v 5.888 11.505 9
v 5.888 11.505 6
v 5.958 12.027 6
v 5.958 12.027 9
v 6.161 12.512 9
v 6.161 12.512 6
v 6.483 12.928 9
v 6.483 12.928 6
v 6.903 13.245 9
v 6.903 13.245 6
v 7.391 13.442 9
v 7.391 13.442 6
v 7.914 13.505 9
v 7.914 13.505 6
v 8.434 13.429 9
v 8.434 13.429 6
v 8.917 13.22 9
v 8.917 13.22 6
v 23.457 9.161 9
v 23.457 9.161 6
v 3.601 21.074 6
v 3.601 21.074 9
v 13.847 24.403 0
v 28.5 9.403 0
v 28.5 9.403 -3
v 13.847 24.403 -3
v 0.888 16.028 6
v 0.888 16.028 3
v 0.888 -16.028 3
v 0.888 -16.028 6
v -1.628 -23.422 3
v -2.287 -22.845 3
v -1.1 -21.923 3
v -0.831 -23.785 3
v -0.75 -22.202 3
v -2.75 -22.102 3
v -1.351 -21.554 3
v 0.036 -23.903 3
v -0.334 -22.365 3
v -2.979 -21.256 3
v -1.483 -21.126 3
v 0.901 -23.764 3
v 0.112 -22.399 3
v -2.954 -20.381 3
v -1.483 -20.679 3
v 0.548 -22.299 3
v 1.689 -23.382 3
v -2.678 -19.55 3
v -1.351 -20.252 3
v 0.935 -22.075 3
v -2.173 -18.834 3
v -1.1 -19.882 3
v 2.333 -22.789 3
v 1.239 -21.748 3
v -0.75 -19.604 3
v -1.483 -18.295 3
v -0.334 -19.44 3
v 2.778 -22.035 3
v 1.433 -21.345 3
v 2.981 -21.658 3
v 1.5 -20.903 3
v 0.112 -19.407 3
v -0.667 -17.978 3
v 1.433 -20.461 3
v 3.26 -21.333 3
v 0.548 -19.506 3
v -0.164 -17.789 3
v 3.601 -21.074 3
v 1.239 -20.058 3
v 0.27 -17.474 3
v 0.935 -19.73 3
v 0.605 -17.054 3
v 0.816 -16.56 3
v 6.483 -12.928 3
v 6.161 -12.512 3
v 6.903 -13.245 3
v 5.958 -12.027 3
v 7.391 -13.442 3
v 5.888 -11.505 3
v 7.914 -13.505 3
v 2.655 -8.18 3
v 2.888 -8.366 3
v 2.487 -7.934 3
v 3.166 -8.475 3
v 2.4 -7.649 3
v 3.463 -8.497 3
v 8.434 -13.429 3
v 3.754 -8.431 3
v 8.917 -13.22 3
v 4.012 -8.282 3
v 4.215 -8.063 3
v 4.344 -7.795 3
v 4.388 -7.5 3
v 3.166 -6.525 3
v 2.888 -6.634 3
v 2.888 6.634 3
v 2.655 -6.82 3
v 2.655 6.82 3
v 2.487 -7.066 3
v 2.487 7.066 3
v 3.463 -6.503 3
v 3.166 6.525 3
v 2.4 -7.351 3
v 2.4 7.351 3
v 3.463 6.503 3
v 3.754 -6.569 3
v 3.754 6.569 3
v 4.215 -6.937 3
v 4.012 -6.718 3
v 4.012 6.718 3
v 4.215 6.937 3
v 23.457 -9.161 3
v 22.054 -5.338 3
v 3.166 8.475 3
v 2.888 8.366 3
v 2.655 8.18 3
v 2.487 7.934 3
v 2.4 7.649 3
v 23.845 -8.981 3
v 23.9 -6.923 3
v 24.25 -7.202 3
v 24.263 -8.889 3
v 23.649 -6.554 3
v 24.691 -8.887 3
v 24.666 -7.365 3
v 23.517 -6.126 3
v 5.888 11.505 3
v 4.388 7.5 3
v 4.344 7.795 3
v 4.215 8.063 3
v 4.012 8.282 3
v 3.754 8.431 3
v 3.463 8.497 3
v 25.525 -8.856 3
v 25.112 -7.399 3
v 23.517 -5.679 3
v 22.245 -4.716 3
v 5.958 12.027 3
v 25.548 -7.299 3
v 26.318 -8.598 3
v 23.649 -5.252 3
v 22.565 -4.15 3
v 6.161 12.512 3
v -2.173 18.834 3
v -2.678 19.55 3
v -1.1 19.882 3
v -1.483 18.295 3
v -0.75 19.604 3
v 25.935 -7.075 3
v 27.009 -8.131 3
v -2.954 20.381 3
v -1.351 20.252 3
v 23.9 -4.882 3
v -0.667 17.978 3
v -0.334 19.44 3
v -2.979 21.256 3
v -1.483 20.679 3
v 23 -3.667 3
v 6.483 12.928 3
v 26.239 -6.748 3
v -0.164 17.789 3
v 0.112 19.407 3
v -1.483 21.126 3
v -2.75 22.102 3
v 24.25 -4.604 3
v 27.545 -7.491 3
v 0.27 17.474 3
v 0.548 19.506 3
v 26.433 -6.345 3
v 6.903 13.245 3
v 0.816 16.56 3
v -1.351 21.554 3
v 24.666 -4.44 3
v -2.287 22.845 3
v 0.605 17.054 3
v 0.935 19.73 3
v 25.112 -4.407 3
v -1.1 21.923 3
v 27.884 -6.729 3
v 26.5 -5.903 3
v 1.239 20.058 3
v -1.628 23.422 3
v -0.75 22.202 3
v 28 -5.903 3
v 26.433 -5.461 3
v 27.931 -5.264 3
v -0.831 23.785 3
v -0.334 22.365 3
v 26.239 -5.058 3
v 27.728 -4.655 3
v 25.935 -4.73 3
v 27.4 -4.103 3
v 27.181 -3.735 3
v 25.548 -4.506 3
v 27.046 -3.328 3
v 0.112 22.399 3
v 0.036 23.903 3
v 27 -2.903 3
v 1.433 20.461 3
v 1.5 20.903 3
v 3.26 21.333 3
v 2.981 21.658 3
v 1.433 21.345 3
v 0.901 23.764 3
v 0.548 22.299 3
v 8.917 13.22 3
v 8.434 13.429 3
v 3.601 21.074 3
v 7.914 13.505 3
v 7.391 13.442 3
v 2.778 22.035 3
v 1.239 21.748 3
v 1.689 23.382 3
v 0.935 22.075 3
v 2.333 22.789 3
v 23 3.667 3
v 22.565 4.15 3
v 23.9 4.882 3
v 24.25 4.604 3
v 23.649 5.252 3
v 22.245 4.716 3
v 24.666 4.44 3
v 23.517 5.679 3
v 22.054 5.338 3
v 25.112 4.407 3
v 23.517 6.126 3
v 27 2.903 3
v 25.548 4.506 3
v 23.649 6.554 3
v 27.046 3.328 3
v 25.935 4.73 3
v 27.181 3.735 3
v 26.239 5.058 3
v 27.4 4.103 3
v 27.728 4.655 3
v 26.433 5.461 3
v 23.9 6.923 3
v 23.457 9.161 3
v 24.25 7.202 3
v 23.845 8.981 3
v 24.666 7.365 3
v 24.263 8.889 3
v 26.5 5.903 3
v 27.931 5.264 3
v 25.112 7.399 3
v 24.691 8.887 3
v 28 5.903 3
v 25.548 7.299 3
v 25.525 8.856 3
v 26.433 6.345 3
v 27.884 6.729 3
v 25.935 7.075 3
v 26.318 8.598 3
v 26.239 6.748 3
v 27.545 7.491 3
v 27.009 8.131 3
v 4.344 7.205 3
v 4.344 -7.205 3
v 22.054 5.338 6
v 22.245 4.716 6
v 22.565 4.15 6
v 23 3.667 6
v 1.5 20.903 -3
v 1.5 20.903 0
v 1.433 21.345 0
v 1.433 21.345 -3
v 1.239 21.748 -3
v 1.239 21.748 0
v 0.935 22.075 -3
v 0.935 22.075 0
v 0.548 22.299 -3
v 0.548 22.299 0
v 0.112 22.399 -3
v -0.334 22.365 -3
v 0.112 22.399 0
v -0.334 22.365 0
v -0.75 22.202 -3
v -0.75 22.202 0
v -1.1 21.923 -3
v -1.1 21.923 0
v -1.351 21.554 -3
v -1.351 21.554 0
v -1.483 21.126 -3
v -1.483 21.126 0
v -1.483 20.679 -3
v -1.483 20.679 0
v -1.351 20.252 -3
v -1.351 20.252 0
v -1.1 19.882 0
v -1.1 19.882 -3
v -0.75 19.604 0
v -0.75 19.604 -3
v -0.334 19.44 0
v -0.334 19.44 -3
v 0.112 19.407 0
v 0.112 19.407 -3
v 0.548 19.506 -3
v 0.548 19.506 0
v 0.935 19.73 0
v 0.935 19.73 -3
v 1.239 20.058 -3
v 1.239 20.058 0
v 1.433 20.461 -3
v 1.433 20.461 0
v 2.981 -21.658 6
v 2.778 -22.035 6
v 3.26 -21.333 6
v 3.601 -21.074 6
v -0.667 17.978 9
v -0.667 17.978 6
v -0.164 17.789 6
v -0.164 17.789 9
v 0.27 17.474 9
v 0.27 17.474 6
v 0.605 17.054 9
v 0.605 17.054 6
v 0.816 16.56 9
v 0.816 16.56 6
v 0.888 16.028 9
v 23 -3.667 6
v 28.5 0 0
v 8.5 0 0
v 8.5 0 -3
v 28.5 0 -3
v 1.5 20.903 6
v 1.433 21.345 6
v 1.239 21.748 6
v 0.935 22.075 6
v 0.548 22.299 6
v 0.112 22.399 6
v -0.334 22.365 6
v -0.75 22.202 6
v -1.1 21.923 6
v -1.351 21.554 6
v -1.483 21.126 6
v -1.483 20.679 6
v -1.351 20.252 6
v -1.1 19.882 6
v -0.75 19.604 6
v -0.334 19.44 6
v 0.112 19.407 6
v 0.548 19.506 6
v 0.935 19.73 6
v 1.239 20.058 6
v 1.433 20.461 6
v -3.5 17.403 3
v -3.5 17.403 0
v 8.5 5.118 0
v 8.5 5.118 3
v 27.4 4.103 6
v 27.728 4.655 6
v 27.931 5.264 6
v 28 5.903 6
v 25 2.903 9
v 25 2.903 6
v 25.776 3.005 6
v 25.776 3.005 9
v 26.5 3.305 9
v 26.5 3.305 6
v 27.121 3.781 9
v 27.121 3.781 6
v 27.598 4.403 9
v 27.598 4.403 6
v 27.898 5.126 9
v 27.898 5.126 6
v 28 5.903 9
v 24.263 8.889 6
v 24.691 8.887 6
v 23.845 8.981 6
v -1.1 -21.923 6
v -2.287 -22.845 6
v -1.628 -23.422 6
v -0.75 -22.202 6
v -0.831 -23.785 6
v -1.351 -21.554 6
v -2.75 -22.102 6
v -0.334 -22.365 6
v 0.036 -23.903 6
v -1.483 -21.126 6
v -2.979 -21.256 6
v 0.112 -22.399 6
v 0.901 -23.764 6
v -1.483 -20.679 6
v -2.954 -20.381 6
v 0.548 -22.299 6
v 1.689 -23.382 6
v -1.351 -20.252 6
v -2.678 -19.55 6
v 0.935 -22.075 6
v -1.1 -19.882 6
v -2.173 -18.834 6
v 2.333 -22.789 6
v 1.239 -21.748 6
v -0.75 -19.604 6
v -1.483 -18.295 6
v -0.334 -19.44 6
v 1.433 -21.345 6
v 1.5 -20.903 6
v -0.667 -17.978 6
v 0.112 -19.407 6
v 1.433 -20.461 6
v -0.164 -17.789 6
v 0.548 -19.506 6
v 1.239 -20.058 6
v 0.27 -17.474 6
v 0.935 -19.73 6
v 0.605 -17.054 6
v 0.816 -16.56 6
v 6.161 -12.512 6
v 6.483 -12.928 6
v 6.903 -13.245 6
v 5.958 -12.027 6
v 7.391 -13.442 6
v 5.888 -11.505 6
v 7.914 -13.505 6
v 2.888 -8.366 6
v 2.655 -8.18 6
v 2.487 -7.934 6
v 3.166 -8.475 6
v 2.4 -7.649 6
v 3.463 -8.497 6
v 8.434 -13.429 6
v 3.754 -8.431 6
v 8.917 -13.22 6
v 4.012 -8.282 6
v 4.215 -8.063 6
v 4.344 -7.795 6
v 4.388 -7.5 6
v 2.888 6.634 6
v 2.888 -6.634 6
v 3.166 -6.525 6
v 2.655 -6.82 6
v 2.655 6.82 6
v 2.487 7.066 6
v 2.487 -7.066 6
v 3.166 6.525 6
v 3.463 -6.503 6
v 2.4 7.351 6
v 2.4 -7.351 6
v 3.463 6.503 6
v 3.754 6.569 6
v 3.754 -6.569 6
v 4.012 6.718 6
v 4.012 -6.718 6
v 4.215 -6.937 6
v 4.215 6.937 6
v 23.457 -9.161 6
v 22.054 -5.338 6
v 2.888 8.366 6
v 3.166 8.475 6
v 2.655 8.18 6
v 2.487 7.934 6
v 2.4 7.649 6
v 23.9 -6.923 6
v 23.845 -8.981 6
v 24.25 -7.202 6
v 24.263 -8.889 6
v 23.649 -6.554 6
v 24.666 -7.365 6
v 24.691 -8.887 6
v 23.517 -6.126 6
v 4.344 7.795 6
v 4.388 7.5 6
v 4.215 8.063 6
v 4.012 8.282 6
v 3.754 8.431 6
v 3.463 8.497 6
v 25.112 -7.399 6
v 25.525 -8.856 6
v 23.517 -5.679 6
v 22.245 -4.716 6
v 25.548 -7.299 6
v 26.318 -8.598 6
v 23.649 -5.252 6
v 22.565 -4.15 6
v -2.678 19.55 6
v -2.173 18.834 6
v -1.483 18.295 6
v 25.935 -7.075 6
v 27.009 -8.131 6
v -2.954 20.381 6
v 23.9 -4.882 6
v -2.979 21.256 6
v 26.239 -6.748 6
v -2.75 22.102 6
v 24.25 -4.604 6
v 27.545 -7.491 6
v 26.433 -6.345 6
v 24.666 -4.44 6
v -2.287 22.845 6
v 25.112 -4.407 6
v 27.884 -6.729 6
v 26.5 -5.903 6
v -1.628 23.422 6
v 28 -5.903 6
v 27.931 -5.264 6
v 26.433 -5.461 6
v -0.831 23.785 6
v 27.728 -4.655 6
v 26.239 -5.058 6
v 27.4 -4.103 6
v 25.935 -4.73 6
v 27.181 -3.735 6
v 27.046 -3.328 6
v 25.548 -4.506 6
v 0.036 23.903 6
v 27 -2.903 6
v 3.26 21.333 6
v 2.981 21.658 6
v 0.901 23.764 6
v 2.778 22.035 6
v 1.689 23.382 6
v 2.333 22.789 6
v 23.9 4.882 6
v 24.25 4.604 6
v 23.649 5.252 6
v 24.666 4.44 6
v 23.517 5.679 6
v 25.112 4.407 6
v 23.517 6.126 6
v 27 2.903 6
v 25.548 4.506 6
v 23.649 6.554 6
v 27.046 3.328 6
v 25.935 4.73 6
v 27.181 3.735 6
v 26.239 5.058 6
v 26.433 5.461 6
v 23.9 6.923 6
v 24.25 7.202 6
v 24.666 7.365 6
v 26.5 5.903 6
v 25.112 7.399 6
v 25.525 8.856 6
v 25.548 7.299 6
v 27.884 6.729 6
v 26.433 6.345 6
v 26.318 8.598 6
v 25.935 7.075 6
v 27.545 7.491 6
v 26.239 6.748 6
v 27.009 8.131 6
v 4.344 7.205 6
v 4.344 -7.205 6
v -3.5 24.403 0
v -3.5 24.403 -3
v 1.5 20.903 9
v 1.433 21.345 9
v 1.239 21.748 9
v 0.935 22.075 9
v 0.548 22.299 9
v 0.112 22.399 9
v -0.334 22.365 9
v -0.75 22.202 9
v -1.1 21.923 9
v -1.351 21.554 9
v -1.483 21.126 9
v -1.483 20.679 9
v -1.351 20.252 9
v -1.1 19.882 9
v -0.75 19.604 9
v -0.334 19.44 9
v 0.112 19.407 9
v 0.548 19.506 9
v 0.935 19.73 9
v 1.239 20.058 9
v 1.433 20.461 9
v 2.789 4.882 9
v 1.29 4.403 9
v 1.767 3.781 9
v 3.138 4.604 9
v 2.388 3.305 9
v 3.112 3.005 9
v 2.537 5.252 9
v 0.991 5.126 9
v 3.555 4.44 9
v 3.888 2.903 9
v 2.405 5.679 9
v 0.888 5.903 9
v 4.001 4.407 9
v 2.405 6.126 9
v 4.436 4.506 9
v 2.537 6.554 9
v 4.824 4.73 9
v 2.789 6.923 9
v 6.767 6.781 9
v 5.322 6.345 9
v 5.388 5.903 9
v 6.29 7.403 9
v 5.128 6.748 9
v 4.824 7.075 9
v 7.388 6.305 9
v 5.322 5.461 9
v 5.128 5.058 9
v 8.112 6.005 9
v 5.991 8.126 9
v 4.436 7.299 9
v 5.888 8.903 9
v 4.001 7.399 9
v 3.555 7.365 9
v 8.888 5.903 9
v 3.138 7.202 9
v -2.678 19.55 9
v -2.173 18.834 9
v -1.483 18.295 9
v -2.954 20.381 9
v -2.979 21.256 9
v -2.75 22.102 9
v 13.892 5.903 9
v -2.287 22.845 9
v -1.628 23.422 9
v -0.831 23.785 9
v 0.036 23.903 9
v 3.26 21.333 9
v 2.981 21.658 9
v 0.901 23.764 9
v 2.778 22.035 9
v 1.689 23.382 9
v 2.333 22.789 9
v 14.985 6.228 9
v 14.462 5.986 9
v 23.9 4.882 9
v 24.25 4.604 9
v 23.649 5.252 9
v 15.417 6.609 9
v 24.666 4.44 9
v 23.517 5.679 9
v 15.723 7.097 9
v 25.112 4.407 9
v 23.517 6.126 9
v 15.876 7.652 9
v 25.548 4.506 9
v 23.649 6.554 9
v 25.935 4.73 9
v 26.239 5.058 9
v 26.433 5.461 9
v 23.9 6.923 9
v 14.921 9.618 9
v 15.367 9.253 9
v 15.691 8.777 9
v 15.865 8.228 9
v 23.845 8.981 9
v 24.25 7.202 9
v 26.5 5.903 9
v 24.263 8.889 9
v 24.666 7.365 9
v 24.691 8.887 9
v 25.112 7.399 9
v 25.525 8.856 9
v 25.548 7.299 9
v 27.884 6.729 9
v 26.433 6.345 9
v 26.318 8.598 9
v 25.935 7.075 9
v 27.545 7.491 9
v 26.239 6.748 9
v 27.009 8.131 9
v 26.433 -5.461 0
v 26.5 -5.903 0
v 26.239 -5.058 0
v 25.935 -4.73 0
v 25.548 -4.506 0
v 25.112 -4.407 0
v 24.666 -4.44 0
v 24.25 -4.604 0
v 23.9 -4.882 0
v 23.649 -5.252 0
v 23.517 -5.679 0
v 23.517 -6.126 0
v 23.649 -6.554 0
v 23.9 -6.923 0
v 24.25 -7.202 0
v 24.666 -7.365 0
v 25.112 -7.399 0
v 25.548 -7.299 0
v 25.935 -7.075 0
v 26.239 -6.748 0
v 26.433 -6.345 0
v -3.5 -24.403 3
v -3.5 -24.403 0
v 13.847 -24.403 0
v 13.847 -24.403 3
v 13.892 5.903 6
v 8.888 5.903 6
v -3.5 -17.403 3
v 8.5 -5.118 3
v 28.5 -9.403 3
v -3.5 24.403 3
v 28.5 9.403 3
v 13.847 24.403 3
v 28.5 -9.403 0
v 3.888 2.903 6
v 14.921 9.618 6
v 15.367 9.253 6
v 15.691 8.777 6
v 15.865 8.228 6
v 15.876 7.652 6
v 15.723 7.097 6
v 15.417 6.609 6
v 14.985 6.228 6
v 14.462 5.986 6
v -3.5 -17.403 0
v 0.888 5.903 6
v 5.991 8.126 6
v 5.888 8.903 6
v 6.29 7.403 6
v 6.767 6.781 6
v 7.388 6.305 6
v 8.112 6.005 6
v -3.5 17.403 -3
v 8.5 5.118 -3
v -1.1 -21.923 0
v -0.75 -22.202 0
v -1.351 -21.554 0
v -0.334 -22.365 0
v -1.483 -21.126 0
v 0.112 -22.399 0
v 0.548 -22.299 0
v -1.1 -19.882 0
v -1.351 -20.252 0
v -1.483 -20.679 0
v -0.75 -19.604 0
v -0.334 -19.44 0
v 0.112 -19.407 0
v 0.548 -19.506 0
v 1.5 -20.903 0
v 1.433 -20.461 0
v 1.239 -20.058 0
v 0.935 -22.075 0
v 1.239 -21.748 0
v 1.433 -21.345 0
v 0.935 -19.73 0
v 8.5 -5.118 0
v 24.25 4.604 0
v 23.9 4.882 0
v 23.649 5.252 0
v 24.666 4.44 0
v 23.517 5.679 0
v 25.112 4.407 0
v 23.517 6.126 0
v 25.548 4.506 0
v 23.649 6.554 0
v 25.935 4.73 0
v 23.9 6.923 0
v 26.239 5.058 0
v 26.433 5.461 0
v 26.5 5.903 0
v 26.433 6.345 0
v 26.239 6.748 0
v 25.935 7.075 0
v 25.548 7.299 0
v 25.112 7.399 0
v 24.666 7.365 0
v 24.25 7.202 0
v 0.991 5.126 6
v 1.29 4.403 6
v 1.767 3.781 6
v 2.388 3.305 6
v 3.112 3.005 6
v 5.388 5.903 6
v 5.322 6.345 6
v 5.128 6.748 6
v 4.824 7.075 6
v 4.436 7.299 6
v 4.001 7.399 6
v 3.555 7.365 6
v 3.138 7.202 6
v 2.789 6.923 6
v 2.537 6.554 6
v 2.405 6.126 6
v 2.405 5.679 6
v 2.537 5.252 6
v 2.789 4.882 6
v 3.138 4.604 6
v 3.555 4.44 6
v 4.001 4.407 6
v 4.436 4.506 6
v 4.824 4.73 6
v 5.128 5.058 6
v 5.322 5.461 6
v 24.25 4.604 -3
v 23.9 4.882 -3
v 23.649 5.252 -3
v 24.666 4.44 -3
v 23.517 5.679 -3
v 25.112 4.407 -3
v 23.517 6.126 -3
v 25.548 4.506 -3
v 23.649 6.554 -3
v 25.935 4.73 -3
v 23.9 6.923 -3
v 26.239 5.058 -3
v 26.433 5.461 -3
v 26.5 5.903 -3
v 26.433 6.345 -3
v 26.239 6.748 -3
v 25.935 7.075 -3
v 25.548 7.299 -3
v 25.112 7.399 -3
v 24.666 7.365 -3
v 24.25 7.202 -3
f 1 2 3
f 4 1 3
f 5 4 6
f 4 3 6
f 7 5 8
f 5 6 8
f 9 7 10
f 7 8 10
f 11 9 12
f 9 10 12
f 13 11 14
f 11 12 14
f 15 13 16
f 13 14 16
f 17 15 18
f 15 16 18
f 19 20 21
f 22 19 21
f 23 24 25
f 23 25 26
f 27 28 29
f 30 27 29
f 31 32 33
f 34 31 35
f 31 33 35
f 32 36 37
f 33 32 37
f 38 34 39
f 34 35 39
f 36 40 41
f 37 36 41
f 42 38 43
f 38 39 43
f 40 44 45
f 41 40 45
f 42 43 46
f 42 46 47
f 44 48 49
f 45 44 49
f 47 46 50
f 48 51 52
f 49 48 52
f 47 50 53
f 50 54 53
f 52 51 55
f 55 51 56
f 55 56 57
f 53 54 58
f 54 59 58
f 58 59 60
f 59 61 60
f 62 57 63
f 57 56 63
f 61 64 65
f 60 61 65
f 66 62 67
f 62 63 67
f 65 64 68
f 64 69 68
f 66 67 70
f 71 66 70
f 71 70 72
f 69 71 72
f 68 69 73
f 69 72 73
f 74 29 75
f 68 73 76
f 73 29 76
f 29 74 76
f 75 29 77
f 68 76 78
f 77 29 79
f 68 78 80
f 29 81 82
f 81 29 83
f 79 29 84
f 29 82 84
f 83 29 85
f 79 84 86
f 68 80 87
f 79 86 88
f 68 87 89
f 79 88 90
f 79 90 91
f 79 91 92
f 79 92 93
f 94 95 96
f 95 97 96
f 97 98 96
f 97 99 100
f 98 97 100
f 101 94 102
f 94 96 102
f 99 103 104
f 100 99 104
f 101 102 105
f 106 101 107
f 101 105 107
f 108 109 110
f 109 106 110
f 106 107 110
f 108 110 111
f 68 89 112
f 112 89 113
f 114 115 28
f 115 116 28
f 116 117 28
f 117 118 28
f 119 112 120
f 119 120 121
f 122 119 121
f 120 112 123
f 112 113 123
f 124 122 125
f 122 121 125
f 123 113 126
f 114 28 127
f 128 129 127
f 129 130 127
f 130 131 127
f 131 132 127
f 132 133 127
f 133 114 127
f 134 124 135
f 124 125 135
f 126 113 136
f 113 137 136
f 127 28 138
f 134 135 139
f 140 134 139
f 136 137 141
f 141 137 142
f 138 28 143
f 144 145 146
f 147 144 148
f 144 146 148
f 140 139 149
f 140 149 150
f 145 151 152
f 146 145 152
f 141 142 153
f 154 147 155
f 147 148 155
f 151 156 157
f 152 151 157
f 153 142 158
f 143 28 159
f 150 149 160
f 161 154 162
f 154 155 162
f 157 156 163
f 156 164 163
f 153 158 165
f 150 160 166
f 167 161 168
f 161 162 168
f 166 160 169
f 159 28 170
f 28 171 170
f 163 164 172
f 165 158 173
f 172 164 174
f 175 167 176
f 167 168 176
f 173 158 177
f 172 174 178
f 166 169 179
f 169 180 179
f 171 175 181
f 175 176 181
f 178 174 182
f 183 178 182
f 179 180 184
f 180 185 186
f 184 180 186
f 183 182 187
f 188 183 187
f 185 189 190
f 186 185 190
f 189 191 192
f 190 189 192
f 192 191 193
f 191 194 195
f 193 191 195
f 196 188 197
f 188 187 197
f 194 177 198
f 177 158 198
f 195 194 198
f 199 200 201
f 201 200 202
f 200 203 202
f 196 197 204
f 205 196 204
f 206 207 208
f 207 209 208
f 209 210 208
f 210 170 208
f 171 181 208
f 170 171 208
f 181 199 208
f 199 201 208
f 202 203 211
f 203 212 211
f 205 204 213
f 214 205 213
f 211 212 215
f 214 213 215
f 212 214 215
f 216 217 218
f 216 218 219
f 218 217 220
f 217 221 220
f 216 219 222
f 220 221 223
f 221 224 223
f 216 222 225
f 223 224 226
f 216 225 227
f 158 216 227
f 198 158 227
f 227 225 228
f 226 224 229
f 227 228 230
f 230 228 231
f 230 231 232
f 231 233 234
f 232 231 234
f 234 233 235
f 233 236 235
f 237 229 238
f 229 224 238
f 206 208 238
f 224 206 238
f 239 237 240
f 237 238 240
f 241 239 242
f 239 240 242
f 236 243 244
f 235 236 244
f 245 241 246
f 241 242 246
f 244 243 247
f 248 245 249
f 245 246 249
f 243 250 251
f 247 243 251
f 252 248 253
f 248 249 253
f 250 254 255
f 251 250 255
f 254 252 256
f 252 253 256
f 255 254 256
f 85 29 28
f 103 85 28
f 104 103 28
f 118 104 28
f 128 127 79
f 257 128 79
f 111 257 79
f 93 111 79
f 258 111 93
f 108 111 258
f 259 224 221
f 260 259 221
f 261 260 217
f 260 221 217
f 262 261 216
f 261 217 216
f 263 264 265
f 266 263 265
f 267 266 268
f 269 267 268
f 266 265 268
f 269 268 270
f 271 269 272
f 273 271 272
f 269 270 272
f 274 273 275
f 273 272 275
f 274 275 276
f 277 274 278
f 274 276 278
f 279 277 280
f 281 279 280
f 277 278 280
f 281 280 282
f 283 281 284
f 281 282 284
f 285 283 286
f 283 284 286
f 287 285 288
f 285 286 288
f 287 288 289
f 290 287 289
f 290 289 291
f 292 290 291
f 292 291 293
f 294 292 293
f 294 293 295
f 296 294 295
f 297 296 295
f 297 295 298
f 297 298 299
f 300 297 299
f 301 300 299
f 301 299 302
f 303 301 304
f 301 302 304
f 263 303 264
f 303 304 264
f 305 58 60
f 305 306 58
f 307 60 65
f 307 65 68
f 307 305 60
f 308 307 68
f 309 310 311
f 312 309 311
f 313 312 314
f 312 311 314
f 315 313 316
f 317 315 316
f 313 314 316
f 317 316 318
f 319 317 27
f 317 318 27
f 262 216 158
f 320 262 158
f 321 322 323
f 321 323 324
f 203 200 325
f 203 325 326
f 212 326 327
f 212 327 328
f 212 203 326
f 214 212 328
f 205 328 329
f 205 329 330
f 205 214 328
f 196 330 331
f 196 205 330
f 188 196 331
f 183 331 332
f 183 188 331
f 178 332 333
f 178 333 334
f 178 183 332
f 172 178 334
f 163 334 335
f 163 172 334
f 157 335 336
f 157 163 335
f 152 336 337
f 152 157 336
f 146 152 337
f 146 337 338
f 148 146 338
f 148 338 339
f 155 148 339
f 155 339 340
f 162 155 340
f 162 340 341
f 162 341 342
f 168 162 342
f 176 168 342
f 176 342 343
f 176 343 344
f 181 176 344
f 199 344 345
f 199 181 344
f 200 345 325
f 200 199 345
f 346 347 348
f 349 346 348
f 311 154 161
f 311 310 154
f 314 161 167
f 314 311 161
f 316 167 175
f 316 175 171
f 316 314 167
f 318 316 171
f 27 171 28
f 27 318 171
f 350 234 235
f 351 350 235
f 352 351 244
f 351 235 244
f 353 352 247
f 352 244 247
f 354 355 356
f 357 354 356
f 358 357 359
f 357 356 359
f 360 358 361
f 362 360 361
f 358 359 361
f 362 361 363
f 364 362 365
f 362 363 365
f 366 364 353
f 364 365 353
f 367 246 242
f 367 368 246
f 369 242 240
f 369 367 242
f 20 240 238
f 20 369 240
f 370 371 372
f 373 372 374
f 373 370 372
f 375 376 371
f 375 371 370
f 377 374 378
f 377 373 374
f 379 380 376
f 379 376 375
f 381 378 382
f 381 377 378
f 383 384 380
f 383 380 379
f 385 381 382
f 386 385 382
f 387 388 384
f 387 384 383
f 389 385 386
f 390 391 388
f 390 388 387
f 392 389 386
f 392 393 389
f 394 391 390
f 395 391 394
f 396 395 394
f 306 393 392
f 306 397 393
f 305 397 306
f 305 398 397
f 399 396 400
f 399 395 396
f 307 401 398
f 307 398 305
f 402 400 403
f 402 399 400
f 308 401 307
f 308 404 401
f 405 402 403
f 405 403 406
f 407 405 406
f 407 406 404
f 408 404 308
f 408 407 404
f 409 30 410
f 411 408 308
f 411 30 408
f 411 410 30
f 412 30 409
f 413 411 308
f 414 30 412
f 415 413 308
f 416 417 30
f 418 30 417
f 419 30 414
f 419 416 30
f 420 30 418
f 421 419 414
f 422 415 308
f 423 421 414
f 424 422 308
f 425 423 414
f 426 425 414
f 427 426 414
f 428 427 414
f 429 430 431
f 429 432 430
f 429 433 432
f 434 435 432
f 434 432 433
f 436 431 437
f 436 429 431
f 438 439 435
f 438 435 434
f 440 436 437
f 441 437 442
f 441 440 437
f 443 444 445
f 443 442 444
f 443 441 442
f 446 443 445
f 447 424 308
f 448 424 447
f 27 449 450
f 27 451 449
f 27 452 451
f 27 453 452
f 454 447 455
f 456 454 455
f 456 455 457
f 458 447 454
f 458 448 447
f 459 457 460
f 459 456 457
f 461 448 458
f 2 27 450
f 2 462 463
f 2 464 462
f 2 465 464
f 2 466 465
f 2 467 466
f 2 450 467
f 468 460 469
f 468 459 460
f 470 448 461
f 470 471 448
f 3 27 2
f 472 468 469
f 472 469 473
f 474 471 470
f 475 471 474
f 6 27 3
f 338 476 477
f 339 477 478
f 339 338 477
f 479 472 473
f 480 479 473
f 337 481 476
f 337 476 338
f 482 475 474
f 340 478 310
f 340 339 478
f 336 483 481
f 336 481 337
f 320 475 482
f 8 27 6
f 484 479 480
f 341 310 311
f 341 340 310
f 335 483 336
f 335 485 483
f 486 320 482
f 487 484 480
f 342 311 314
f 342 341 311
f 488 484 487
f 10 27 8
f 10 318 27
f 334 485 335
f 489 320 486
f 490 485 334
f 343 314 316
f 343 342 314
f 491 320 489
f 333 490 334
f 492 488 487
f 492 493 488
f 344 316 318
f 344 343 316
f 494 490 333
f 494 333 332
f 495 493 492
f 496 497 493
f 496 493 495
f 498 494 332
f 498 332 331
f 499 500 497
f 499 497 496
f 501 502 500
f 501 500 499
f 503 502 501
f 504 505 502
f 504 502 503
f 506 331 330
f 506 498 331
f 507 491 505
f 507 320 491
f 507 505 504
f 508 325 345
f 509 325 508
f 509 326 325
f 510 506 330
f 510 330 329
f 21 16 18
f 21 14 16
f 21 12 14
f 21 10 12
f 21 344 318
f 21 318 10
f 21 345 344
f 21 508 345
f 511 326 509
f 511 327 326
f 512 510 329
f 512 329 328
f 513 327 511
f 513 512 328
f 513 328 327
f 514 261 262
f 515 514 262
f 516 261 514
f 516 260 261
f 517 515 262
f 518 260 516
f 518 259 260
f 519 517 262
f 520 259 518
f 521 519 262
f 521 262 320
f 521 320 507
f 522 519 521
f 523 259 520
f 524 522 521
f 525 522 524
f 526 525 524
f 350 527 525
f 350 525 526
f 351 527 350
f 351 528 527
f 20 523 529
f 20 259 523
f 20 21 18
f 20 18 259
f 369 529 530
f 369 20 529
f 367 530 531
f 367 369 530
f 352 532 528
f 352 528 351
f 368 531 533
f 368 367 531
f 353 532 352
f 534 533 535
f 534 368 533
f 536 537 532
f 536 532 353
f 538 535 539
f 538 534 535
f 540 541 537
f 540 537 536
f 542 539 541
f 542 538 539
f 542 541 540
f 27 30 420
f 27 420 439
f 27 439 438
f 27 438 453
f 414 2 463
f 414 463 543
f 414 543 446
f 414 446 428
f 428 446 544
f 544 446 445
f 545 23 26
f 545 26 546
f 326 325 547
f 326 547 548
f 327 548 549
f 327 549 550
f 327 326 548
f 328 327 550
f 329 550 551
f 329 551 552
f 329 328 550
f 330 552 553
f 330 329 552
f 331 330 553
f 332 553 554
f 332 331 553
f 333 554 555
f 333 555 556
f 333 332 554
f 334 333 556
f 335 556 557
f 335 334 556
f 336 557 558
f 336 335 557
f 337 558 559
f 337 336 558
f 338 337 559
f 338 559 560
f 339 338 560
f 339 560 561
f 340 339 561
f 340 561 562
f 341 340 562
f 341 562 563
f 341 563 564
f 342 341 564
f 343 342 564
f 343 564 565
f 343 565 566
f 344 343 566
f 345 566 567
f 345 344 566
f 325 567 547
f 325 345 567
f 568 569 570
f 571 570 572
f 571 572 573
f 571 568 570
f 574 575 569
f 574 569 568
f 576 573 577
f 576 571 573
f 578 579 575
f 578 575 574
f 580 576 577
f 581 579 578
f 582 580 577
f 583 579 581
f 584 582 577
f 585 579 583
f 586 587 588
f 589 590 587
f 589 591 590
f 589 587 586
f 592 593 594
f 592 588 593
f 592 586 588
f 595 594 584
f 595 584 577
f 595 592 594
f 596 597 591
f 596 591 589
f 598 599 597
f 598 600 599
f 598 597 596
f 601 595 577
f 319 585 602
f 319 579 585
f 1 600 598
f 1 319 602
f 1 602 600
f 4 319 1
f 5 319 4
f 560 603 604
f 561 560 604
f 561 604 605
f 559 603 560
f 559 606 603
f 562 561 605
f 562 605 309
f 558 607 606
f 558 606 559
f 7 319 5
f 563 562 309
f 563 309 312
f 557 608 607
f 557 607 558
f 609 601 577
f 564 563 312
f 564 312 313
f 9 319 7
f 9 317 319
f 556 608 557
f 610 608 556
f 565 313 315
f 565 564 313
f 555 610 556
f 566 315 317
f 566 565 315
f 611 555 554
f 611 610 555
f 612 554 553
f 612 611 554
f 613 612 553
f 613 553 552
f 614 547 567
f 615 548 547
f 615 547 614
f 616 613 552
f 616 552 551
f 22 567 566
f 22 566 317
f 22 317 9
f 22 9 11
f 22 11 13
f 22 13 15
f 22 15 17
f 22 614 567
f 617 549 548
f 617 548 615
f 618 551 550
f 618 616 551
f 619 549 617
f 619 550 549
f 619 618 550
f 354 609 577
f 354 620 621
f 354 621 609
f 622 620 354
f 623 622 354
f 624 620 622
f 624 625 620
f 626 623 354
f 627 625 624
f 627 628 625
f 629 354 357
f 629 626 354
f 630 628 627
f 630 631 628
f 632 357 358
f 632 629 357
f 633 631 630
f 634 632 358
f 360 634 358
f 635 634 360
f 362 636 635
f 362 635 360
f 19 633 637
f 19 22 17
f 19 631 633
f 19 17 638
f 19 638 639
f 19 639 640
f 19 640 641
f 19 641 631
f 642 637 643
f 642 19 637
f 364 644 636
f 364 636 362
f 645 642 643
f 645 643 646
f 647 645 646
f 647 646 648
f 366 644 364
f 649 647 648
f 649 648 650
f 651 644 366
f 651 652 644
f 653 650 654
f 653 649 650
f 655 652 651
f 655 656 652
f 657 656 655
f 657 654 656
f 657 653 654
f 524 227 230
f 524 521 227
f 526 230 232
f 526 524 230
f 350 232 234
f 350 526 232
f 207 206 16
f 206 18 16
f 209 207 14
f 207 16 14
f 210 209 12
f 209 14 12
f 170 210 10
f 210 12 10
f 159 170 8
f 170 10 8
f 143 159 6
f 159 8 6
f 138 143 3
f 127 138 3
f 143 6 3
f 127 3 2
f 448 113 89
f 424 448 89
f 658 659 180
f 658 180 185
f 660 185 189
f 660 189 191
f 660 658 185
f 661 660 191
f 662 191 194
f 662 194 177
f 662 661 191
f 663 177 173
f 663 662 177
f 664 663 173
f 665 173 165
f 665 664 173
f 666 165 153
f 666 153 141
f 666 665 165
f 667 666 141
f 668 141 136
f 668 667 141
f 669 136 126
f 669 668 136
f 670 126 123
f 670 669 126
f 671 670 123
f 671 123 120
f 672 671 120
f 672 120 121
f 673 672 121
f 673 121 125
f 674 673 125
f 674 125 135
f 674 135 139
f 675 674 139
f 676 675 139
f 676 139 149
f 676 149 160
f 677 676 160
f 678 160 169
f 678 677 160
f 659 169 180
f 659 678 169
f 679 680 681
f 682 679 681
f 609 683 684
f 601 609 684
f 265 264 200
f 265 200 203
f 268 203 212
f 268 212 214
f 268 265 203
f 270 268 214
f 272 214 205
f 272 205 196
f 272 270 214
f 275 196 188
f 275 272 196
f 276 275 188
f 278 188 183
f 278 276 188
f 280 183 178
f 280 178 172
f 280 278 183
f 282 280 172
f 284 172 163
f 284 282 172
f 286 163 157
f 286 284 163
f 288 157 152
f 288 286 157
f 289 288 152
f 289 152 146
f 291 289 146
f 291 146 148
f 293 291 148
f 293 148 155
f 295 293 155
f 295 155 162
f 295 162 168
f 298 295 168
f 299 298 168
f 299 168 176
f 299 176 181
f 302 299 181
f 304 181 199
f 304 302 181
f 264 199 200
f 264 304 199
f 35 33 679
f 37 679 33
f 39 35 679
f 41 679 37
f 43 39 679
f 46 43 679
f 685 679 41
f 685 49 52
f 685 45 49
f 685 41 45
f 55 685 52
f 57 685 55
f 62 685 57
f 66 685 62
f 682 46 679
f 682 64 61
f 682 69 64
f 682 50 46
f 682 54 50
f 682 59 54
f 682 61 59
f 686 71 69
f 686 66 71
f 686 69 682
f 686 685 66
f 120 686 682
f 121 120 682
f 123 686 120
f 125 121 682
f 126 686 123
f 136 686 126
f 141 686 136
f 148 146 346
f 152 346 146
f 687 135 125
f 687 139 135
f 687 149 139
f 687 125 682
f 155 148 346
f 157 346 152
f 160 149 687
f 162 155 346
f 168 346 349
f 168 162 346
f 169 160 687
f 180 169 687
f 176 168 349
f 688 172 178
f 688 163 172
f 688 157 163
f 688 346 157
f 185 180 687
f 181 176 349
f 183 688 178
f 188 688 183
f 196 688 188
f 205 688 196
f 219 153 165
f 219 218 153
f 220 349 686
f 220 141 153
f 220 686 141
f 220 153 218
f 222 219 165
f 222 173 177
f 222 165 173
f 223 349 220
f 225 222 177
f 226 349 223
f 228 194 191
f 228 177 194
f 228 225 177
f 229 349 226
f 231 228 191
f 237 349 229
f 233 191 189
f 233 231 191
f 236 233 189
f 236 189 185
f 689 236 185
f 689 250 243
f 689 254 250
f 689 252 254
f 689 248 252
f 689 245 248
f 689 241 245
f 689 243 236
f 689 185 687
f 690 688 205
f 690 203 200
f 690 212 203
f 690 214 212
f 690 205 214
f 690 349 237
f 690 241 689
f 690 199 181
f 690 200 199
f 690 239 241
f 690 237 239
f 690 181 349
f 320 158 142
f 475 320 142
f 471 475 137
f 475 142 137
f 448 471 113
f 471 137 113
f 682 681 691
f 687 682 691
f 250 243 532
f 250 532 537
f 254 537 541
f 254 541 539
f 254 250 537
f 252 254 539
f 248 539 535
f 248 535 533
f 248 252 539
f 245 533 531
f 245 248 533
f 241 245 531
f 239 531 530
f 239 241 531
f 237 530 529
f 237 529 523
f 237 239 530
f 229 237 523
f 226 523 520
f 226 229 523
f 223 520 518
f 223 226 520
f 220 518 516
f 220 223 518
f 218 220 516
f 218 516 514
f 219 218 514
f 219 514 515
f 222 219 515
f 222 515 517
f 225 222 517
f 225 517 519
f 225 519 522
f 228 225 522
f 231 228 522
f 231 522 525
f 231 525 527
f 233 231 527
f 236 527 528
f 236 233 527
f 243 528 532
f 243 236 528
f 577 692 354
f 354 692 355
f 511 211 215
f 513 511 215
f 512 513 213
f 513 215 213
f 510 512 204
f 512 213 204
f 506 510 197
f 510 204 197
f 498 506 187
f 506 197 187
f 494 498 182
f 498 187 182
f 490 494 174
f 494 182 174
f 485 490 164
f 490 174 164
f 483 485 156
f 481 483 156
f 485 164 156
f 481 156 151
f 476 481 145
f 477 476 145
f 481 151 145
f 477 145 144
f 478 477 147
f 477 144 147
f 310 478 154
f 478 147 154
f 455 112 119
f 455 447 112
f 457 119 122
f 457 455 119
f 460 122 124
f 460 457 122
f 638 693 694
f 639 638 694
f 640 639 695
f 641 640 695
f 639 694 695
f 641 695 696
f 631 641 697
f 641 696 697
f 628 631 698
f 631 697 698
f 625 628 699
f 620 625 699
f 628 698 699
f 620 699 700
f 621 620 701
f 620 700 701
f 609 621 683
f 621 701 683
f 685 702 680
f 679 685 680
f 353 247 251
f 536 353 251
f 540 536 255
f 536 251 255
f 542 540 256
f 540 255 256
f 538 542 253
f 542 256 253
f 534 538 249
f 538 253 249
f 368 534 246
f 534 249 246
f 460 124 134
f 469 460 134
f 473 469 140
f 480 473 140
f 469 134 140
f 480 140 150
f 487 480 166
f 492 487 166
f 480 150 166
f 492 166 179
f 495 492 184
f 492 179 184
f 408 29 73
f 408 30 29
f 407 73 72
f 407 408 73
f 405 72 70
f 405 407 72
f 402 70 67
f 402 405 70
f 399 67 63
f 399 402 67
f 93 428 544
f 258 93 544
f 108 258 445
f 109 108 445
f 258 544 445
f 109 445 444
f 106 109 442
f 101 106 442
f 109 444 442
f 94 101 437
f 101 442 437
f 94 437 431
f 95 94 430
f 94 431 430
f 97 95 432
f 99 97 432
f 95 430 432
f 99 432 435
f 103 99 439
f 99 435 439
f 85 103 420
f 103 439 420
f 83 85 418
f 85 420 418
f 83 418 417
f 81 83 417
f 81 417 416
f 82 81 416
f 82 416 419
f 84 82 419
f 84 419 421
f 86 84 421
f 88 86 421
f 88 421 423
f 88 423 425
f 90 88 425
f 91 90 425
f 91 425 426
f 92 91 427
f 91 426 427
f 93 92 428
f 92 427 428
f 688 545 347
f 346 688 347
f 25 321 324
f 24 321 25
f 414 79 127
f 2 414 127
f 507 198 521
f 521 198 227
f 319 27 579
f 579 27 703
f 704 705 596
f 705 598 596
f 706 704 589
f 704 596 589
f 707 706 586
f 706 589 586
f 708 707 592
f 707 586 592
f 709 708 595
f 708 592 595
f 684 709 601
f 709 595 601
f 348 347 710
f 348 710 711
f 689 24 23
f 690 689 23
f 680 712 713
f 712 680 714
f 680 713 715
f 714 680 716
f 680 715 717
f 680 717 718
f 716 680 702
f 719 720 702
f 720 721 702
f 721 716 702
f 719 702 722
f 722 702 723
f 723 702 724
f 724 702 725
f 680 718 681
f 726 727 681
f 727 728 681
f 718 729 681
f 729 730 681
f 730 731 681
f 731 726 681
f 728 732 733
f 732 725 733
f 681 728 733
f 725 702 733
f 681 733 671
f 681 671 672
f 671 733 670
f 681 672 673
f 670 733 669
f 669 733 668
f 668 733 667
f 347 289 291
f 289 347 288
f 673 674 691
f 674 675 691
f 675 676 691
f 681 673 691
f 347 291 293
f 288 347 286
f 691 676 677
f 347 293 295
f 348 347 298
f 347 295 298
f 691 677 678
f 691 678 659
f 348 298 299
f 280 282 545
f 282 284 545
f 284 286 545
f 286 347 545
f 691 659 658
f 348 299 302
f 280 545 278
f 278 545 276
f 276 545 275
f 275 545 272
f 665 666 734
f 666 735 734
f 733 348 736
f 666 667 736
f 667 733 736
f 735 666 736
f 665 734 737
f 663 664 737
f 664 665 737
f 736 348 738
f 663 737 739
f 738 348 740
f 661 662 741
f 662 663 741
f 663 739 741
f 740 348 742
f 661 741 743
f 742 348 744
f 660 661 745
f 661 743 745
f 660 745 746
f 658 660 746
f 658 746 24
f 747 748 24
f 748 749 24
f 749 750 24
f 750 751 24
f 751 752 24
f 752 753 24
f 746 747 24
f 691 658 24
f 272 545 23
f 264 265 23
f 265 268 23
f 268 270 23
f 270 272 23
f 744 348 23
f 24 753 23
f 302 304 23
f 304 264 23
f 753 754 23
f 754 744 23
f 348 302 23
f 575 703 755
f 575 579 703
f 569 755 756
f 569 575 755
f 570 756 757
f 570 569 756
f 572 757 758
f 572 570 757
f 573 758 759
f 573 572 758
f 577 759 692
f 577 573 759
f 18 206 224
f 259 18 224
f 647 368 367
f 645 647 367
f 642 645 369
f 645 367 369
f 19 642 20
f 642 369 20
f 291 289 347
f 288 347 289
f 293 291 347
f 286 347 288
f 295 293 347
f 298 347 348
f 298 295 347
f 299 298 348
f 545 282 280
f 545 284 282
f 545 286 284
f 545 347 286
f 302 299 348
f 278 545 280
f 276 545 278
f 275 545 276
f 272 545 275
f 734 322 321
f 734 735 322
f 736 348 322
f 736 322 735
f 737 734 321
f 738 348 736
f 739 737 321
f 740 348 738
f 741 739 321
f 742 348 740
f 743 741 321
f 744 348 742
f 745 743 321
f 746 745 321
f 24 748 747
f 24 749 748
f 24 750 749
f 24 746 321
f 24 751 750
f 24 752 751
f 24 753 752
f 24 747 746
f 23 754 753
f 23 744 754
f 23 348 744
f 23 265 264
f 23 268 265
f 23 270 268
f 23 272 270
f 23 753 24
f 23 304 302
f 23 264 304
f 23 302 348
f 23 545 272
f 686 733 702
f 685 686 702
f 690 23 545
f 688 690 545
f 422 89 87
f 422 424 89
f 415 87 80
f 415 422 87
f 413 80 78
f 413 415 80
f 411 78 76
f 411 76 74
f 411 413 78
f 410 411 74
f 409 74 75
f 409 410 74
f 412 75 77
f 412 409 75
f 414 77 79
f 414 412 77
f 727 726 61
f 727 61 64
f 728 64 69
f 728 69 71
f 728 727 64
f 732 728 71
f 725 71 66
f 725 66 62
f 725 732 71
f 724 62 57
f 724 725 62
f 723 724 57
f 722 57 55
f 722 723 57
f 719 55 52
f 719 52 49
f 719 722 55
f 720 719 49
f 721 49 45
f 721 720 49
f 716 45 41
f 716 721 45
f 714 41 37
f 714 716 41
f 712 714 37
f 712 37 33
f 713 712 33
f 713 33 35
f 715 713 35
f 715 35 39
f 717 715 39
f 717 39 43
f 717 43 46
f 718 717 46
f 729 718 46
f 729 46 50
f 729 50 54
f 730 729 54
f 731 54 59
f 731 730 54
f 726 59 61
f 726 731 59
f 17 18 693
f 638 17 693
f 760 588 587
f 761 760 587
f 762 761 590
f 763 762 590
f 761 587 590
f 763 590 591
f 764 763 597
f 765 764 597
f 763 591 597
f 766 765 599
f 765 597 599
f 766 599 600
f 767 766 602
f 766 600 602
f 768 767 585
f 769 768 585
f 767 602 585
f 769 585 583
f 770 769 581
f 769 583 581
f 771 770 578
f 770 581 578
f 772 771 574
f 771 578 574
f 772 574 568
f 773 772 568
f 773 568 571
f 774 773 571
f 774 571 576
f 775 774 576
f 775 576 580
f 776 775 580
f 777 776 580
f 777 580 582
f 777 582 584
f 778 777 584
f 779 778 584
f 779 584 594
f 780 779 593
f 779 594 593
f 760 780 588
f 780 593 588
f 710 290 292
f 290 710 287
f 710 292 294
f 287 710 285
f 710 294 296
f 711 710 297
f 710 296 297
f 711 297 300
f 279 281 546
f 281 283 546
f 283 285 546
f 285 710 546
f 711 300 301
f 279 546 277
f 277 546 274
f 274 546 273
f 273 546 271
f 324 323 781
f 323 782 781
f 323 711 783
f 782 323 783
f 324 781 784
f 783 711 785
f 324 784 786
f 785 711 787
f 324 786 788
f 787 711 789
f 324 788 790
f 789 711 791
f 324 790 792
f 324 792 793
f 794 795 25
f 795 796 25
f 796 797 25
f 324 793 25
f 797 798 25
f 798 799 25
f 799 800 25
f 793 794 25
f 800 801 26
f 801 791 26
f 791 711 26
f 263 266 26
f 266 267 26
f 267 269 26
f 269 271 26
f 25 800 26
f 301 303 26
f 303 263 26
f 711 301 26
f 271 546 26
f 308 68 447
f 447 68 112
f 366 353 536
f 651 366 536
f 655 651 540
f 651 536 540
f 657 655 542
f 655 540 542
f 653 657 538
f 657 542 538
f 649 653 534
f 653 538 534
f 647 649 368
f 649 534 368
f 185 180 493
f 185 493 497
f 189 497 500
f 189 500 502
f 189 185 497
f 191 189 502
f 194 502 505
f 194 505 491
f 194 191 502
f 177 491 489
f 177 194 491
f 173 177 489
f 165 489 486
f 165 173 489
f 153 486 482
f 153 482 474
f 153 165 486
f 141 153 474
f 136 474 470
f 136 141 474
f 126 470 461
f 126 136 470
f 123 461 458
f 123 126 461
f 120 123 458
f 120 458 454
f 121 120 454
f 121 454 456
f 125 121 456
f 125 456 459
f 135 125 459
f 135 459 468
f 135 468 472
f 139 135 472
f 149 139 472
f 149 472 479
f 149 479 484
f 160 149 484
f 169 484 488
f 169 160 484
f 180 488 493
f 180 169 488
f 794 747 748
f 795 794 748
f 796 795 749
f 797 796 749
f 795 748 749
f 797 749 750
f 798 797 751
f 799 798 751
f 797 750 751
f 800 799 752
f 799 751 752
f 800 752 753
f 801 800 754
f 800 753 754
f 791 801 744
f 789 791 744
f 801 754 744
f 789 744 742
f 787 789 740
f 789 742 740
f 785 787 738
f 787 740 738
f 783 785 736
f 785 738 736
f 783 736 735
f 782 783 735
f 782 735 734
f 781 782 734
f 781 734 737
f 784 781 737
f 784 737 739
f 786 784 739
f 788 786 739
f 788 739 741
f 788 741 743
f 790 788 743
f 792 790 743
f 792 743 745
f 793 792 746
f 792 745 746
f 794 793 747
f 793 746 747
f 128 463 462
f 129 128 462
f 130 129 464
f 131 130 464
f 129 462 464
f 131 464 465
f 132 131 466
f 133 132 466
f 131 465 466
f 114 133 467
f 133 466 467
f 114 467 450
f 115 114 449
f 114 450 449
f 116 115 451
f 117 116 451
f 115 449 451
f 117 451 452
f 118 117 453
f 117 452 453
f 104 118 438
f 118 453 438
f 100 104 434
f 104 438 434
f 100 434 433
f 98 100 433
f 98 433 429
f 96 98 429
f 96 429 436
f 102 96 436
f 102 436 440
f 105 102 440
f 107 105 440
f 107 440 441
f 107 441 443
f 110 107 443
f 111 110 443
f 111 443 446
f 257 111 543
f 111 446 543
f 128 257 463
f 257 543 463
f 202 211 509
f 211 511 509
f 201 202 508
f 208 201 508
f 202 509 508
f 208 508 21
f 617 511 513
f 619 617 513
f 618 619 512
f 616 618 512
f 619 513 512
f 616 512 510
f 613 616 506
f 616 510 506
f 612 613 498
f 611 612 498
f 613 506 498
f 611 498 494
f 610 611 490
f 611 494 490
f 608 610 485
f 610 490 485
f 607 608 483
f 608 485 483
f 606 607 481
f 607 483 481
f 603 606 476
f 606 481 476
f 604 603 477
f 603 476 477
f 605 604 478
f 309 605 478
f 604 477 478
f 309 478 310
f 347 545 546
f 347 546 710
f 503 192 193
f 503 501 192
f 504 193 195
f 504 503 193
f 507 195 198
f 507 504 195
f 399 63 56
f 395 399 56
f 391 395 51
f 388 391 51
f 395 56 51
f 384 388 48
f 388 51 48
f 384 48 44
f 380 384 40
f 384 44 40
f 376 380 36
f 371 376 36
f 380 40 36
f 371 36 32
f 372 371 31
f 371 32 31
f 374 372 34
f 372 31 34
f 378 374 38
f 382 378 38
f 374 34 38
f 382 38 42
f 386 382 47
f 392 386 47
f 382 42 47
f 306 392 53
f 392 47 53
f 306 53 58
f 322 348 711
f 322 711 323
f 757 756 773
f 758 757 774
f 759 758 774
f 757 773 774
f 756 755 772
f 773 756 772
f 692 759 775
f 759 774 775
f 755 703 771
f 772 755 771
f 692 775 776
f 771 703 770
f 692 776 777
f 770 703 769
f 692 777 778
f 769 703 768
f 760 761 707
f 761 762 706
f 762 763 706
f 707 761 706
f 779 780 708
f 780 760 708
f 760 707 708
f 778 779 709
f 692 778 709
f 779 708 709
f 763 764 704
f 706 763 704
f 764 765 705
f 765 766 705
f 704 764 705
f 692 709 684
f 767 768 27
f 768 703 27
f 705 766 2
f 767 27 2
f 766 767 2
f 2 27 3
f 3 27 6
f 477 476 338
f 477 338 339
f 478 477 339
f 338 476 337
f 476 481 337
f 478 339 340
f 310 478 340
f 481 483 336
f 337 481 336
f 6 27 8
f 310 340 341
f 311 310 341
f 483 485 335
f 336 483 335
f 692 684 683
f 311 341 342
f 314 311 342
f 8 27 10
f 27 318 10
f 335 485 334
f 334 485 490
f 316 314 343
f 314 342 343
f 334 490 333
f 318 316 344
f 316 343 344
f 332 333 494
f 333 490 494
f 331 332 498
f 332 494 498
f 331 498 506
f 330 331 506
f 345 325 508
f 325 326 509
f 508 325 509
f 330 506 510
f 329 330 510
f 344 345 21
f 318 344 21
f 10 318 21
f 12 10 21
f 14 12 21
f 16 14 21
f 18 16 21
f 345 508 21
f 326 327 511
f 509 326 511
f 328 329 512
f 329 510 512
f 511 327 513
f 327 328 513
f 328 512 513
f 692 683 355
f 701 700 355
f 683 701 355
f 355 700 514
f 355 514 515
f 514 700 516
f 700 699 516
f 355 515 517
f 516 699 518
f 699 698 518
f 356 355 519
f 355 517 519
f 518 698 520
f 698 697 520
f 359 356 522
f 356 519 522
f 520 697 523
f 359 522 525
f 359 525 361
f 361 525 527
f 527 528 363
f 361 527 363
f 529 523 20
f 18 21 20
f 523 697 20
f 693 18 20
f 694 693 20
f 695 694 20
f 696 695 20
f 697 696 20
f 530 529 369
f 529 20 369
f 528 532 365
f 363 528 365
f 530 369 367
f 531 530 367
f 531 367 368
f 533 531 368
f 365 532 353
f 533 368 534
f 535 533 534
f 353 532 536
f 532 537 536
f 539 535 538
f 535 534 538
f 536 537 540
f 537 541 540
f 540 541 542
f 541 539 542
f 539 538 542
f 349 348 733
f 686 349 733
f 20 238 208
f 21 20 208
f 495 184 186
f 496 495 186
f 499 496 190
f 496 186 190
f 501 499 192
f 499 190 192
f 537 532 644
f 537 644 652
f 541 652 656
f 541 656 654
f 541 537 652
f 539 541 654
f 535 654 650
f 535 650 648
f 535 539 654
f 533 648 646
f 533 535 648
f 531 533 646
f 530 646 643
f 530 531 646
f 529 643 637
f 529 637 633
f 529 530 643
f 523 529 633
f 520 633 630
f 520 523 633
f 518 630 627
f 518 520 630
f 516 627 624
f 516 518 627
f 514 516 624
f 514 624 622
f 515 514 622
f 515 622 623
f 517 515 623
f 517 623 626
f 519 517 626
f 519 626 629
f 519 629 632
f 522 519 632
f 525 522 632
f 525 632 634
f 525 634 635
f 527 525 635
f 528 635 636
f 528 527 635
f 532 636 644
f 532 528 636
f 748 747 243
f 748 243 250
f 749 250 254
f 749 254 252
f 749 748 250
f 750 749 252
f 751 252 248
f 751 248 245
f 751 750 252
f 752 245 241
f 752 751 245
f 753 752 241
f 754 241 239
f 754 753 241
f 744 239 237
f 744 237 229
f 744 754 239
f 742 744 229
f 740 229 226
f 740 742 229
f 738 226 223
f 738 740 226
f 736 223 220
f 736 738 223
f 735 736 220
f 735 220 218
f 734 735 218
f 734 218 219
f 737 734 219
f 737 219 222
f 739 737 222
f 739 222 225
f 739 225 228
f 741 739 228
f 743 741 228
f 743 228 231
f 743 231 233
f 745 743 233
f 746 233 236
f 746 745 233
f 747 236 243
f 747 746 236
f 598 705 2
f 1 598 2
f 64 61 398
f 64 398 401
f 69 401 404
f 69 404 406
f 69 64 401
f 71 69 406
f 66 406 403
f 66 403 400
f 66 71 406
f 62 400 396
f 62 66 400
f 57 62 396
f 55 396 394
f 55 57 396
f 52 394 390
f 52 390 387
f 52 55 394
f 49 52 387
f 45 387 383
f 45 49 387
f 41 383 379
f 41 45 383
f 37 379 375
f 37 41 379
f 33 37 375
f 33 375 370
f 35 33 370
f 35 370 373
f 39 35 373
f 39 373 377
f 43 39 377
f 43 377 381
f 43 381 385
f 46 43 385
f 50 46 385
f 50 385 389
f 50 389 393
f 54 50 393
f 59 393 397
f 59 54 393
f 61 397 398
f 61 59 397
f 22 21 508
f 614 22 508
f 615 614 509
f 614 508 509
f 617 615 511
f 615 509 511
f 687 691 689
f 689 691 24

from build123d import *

# Parameters (mm, degrees)
F0_R      = 1.5
F1_DEPTH  = 3
F2_DEPTH  = 3
F3_R      = 1.5
F4_DEPTH  = 3
F5_R      = 2
F6_R      = 1.5
F7_DEPTH  = 3
F8_R      = 3
F9_R      = 1
F10_DEPTH = 3
F11_R     = 1.5
F12_DEPTH = 3


with BuildPart() as f1:
    # F0 (on Top) → F1 (new body)
    with BuildSketch(Plane.XY):
        Polygon((-3.5, 17.40274), (8.5, 5.1184529412), (8.5, 0), (28.5, 0), (28.5, 9.40274), (13.8471349914, 24.40274), (-3.5, 24.40274), align=None)
        with Locations((0, 20.90274)):
            Circle(F0_R, mode=Mode.SUBTRACT)
        with Locations((25, 5.90274)):
            Circle(F0_R, mode=Mode.SUBTRACT)
        Polygon((28.5, 0), (8.5, 0), (8.5, -5.1184529412), (-3.5, -17.40274), (-3.5, -24.40274), (13.8471349914, -24.40274), (28.5, -9.40274), align=None)
        with Locations((0, -20.90274)):
            Circle(F0_R, mode=Mode.SUBTRACT)
        with Locations((25, -5.90274)):
            Circle(F0_R, mode=Mode.SUBTRACT)
    extrude(amount=F1_DEPTH)


with BuildPart() as f2:
    # F0 (on Top) → F2 (new body)
    with BuildSketch(Plane.XY):
        Polygon((-3.5, 17.40274), (8.5, 5.1184529412), (8.5, 0), (28.5, 0), (28.5, 9.40274), (13.8471349914, 24.40274), (-3.5, 24.40274), align=None)
        with Locations((0, 20.90274)):
            Circle(F0_R, mode=Mode.SUBTRACT)
        with Locations((25, 5.90274)):
            Circle(F0_R, mode=Mode.SUBTRACT)
    extrude(amount=-F2_DEPTH)


with BuildPart() as f4:
    # F3 (on face) → F4 (new body)
    with BuildSketch(Plane.XY.offset(3)):
        with BuildLine():
            ThreePointArc((0.8884209613, 18.0373066653), (2.415084148, 19.1230297545), (3, 20.90274))
            ThreePointArc((3, 20.90274), (2.9865709391, 21.1862784022), (2.946403983, 21.4672783682))
            ThreePointArc((2.946403983, 21.4672783682), (-2.5724787771, 22.4462272663), (0.8884209613, 18.0373066653))
        make_face()
        with Locations((0, 20.90274)):
            Circle(F3_R, mode=Mode.SUBTRACT)
        with BuildLine():
            ThreePointArc((3, -20.90274), (2.415084148, -19.1230297545), (0.8884209613, -18.0373066653))
            ThreePointArc((0.8884209613, -18.0373066653), (-2.5724787771, -22.4462272663), (2.946403983, -21.4672783682))
            ThreePointArc((2.946403983, -21.4672783682), (2.9865709391, -21.1862784022), (3, -20.90274))
        make_face()
        with Locations((0, -20.90274)):
            Circle(F3_R, mode=Mode.SUBTRACT)
        with BuildLine():
            Line((27, -3.6666720225), (27, 3.6666720225))
            ThreePointArc((27, 3.6666720225), (25, 2.90274), (23, 3.6666720225))
            Line((23, 3.6666720225), (23, -3.6666720225))
            ThreePointArc((23, -3.6666720225), (25, -2.90274), (27, -3.6666720225))
        make_face()
        with BuildLine():
            ThreePointArc((28, 5.90274), (26.7797102455, 8.317824148), (24.1115790387, 8.7681733347))
            ThreePointArc((24.1115790387, 8.7681733347), (22.4275212229, 7.4462272663), (22.053596017, 5.3382016318))
            ThreePointArc((22.053596017, 5.3382016318), (22.3894002797, 4.424643555), (23, 3.6666720225))
            ThreePointArc((23, 3.6666720225), (25, 2.90274), (27, 3.6666720225))
            ThreePointArc((27, 3.6666720225), (27.7386127875, 4.6779951286), (28, 5.90274))
        make_face()
        with Locations((25, 5.90274)):
            Circle(F3_R, mode=Mode.SUBTRACT)
        with BuildLine():
            ThreePointArc((2.946403983, 21.4672783682), (2.9865709391, 21.1862784022), (3, 20.90274))
            ThreePointArc((3, 20.90274), (2.415084148, 19.1230297545), (0.8884209613, 18.0373066653))
            Line((0.8884209613, 18.0373066653), (5.8884209613, 15.0373066653))
            Line((5.8884209613, 15.0373066653), (22.053596017, 5.3382016318))
            ThreePointArc((22.053596017, 5.3382016318), (22.4275212229, 7.4462272663), (24.1115790387, 8.7681733347))
            Line((24.1115790387, 8.7681733347), (2.946403983, 21.4672783682))
        make_face()
        with BuildLine():
            ThreePointArc((28, -5.90274), (27.7386127875, -4.6779951286), (27, -3.6666720225))
            ThreePointArc((27, -3.6666720225), (25, -2.90274), (23, -3.6666720225))
            ThreePointArc((23, -3.6666720225), (22.3894002797, -4.424643555), (22.053596017, -5.3382016318))
            ThreePointArc((22.053596017, -5.3382016318), (22.4275212229, -7.4462272663), (24.1115790387, -8.7681733347))
            ThreePointArc((24.1115790387, -8.7681733347), (26.7797102455, -8.317824148), (28, -5.90274))
        make_face()
        with Locations((25, -5.90274)):
            Circle(F3_R, mode=Mode.SUBTRACT)
        with BuildLine():
            Line((5.8884209613, -15.0373066653), (0.8884209613, -18.0373066653))
            ThreePointArc((0.8884209613, -18.0373066653), (2.415084148, -19.1230297545), (3, -20.90274))
            ThreePointArc((3, -20.90274), (2.9865709391, -21.1862784022), (2.946403983, -21.4672783682))
            Line((2.946403983, -21.4672783682), (24.1115790387, -8.7681733347))
            ThreePointArc((24.1115790387, -8.7681733347), (22.4275212229, -7.4462272663), (22.053596017, -5.3382016318))
            Line((22.053596017, -5.3382016318), (5.8884209613, -15.0373066653))
        make_face()
        Polygon((5.8884209613, 15.0373066653), (0.8884209613, 18.0373066653), (0.8884209613, 12.9103547647), (5.8884209613, 7.7919018236), align=None)
        Polygon((5.8884209613, -7.7919018236), (0.8884209613, -12.9103547647), (0.8884209613, -18.0373066653), (5.8884209613, -15.0373066653), align=None)
        Polygon((5.8884209613, 7.7919018236), (0.8884209613, 12.9103547647), (0.8884209613, -12.9103547647), (5.8884209613, -7.7919018236), align=None)
    extrude(amount=F4_DEPTH)

    # F5
    f5_edges = [f4.edges().sort_by_distance(p)[0] for p in [
        (0.888421, 18.037307, 4.5),
        (0.888421, -18.037307, 4.5),
        (2.946404, -21.467278, 4.5),
        (24.111579, -8.768173, 4.5),
        (27, 3.666672, 4.5),
        (27, -3.666672, 4.5),
        (24.111579, 8.768173, 4.5),
        (5.888421, -15.037307, 4.5),
        (5.888421, 15.037307, 4.5),
        (2.946404, 21.467278, 4.5),
    ]]
    fillet(f5_edges, radius=F5_R)

    # F9 (on face) → F10 (cut, through all)
    with BuildSketch(Plane.XY.offset(6)):
        with Locations((3.3884209613, 7.5)):
            Circle(F9_R)
        with Locations((3.3884209613, -7.5)):
            Circle(F9_R)
    extrude(amount=-F10_DEPTH, mode=Mode.SUBTRACT)


with BuildPart() as f7:
    # F6 (on face) → F7 (new body)
    with BuildSketch(Plane.XY.offset(6)):
        with BuildLine():
            ThreePointArc((0.8884209613, 18.0373066653), (2.415084148, 19.1230297545), (3, 20.90274))
            ThreePointArc((3, 20.90274), (2.9865709391, 21.1862784022), (2.946403983, 21.4672783682))
            ThreePointArc((2.946403983, 21.4672783682), (2.8763632372, 21.7551099475), (2.7782770793, 22.0346306619))
            ThreePointArc((2.7782770793, 22.0346306619), (-2.2866711137, 22.8446810953), (-0.6669474232, 17.9778158754))
            ThreePointArc((-0.6669474232, 17.9778158754), (0.1146622018, 17.9049320376), (0.8884209613, 18.0373066653))
        make_face()
        with Locations((0, 20.90274)):
            Circle(F6_R, mode=Mode.SUBTRACT)
        with BuildLine():
            ThreePointArc((2.946403983, 21.4672783682), (2.9865709391, 21.1862784022), (3, 20.90274))
            ThreePointArc((3, 20.90274), (2.415084148, 19.1230297545), (0.8884209613, 18.0373066653))
            Line((0.8884209613, 18.0373066653), (5.8884209613, 15.0373066653))
            Line((5.8884209613, 15.0373066653), (8.9174124721, 13.2199117588))
            Line((8.9174124721, 13.2199117588), (14.9210556511, 9.6177258514))
            ThreePointArc((14.9210556511, 9.6177258514), (15.8194939966, 7.3688728362), (13.8920641402, 5.90274))
            Line((13.8920641402, 5.90274), (5.8884209613, 5.90274))
            Line((5.8884209613, 5.90274), (5.8884209613, 2.90274))
            Line((5.8884209613, 2.90274), (25, 2.90274))
            ThreePointArc((25, 2.90274), (22.0338324386, 5.453462805), (24.1115790387, 8.7681733347))
            Line((24.1115790387, 8.7681733347), (23.4565127337, 9.1612131177))
            Line((23.4565127337, 9.1612131177), (3.601470288, 21.0742385851))
            Line((3.601470288, 21.0742385851), (2.946403983, 21.4672783682))
        make_face()
        with BuildLine():
            ThreePointArc((2.7782770793, 22.0346306619), (2.8763632372, 21.7551099475), (2.946403983, 21.4672783682))
            Line((2.946403983, 21.4672783682), (3.601470288, 21.0742385851))
            ThreePointArc((3.601470288, 21.0742385851), (3.1119485941, 21.4876416897), (2.7782770793, 22.0346306619))
        make_face()
        with BuildLine():
            Line((0.8884209613, 16.027866459), (0.8884209613, 18.0373066653))
            ThreePointArc((0.8884209613, 18.0373066653), (0.1146622018, 17.9049320376), (-0.6669474232, 17.9778158754))
            ThreePointArc((-0.6669474232, 17.9778158754), (0.4519527376, 17.2750105503), (0.8884209613, 16.027866459))
        make_face()
        Polygon((5.8884209613, 15.0373066653), (0.8884209613, 18.0373066653), (0.8884209613, 16.027866459), (0.8884209613, 2.90274), (5.8884209613, 2.90274), (5.8884209613, 5.90274), (5.8884209613, 11.5049259074), align=None)
        with BuildLine():
            ThreePointArc((24.6913025467, 8.8868153815), (24.0516433289, 8.9238248488), (23.4565127337, 9.1612131177))
            Line((23.4565127337, 9.1612131177), (24.1115790387, 8.7681733347))
            ThreePointArc((24.1115790387, 8.7681733347), (24.3985084303, 8.8418228317), (24.6913025467, 8.8868153815))
        make_face()
        with BuildLine():
            ThreePointArc((24.6913025467, 8.8868153815), (24.3985084303, 8.8418228317), (24.1115790387, 8.7681733347))
            ThreePointArc((24.1115790387, 8.7681733347), (22.0338324386, 5.453462805), (25, 2.90274))
            ThreePointArc((25, 2.90274), (27.1213203436, 3.7814196564), (28, 5.90274))
            ThreePointArc((28, 5.90274), (27.0092172158, 8.1305295277), (24.6913025467, 8.8868153815))
        make_face()
        with Locations((25, 5.90274)):
            Circle(F6_R, mode=Mode.SUBTRACT)
        with BuildLine():
            Line((8.9174124721, 13.2199117588), (5.8884209613, 15.0373066653))
            Line((5.8884209613, 15.0373066653), (5.8884209613, 11.5049259074))
            ThreePointArc((5.8884209613, 11.5049259074), (6.9030233313, 13.2453257209), (8.9174124721, 13.2199117588))
        make_face()
    extrude(amount=F7_DEPTH)

    # F8
    f8_edges = [f7.edges().sort_by_distance(p)[0] for p in [
        (5.888421, 5.90274, 7.5),
        (0.888421, 2.90274, 7.5),
    ]]
    fillet(f8_edges, radius=F8_R)

    # F11 (on face) → F12 (cut, through all)
    with BuildSketch(Plane.XY.offset(9)):
        with Locations((3.8884209613, 5.90274)):
            Circle(F11_R)
    extrude(amount=-F12_DEPTH, mode=Mode.SUBTRACT)


solid = Compound([f1.part, f2.part, f4.part, f7.part])
